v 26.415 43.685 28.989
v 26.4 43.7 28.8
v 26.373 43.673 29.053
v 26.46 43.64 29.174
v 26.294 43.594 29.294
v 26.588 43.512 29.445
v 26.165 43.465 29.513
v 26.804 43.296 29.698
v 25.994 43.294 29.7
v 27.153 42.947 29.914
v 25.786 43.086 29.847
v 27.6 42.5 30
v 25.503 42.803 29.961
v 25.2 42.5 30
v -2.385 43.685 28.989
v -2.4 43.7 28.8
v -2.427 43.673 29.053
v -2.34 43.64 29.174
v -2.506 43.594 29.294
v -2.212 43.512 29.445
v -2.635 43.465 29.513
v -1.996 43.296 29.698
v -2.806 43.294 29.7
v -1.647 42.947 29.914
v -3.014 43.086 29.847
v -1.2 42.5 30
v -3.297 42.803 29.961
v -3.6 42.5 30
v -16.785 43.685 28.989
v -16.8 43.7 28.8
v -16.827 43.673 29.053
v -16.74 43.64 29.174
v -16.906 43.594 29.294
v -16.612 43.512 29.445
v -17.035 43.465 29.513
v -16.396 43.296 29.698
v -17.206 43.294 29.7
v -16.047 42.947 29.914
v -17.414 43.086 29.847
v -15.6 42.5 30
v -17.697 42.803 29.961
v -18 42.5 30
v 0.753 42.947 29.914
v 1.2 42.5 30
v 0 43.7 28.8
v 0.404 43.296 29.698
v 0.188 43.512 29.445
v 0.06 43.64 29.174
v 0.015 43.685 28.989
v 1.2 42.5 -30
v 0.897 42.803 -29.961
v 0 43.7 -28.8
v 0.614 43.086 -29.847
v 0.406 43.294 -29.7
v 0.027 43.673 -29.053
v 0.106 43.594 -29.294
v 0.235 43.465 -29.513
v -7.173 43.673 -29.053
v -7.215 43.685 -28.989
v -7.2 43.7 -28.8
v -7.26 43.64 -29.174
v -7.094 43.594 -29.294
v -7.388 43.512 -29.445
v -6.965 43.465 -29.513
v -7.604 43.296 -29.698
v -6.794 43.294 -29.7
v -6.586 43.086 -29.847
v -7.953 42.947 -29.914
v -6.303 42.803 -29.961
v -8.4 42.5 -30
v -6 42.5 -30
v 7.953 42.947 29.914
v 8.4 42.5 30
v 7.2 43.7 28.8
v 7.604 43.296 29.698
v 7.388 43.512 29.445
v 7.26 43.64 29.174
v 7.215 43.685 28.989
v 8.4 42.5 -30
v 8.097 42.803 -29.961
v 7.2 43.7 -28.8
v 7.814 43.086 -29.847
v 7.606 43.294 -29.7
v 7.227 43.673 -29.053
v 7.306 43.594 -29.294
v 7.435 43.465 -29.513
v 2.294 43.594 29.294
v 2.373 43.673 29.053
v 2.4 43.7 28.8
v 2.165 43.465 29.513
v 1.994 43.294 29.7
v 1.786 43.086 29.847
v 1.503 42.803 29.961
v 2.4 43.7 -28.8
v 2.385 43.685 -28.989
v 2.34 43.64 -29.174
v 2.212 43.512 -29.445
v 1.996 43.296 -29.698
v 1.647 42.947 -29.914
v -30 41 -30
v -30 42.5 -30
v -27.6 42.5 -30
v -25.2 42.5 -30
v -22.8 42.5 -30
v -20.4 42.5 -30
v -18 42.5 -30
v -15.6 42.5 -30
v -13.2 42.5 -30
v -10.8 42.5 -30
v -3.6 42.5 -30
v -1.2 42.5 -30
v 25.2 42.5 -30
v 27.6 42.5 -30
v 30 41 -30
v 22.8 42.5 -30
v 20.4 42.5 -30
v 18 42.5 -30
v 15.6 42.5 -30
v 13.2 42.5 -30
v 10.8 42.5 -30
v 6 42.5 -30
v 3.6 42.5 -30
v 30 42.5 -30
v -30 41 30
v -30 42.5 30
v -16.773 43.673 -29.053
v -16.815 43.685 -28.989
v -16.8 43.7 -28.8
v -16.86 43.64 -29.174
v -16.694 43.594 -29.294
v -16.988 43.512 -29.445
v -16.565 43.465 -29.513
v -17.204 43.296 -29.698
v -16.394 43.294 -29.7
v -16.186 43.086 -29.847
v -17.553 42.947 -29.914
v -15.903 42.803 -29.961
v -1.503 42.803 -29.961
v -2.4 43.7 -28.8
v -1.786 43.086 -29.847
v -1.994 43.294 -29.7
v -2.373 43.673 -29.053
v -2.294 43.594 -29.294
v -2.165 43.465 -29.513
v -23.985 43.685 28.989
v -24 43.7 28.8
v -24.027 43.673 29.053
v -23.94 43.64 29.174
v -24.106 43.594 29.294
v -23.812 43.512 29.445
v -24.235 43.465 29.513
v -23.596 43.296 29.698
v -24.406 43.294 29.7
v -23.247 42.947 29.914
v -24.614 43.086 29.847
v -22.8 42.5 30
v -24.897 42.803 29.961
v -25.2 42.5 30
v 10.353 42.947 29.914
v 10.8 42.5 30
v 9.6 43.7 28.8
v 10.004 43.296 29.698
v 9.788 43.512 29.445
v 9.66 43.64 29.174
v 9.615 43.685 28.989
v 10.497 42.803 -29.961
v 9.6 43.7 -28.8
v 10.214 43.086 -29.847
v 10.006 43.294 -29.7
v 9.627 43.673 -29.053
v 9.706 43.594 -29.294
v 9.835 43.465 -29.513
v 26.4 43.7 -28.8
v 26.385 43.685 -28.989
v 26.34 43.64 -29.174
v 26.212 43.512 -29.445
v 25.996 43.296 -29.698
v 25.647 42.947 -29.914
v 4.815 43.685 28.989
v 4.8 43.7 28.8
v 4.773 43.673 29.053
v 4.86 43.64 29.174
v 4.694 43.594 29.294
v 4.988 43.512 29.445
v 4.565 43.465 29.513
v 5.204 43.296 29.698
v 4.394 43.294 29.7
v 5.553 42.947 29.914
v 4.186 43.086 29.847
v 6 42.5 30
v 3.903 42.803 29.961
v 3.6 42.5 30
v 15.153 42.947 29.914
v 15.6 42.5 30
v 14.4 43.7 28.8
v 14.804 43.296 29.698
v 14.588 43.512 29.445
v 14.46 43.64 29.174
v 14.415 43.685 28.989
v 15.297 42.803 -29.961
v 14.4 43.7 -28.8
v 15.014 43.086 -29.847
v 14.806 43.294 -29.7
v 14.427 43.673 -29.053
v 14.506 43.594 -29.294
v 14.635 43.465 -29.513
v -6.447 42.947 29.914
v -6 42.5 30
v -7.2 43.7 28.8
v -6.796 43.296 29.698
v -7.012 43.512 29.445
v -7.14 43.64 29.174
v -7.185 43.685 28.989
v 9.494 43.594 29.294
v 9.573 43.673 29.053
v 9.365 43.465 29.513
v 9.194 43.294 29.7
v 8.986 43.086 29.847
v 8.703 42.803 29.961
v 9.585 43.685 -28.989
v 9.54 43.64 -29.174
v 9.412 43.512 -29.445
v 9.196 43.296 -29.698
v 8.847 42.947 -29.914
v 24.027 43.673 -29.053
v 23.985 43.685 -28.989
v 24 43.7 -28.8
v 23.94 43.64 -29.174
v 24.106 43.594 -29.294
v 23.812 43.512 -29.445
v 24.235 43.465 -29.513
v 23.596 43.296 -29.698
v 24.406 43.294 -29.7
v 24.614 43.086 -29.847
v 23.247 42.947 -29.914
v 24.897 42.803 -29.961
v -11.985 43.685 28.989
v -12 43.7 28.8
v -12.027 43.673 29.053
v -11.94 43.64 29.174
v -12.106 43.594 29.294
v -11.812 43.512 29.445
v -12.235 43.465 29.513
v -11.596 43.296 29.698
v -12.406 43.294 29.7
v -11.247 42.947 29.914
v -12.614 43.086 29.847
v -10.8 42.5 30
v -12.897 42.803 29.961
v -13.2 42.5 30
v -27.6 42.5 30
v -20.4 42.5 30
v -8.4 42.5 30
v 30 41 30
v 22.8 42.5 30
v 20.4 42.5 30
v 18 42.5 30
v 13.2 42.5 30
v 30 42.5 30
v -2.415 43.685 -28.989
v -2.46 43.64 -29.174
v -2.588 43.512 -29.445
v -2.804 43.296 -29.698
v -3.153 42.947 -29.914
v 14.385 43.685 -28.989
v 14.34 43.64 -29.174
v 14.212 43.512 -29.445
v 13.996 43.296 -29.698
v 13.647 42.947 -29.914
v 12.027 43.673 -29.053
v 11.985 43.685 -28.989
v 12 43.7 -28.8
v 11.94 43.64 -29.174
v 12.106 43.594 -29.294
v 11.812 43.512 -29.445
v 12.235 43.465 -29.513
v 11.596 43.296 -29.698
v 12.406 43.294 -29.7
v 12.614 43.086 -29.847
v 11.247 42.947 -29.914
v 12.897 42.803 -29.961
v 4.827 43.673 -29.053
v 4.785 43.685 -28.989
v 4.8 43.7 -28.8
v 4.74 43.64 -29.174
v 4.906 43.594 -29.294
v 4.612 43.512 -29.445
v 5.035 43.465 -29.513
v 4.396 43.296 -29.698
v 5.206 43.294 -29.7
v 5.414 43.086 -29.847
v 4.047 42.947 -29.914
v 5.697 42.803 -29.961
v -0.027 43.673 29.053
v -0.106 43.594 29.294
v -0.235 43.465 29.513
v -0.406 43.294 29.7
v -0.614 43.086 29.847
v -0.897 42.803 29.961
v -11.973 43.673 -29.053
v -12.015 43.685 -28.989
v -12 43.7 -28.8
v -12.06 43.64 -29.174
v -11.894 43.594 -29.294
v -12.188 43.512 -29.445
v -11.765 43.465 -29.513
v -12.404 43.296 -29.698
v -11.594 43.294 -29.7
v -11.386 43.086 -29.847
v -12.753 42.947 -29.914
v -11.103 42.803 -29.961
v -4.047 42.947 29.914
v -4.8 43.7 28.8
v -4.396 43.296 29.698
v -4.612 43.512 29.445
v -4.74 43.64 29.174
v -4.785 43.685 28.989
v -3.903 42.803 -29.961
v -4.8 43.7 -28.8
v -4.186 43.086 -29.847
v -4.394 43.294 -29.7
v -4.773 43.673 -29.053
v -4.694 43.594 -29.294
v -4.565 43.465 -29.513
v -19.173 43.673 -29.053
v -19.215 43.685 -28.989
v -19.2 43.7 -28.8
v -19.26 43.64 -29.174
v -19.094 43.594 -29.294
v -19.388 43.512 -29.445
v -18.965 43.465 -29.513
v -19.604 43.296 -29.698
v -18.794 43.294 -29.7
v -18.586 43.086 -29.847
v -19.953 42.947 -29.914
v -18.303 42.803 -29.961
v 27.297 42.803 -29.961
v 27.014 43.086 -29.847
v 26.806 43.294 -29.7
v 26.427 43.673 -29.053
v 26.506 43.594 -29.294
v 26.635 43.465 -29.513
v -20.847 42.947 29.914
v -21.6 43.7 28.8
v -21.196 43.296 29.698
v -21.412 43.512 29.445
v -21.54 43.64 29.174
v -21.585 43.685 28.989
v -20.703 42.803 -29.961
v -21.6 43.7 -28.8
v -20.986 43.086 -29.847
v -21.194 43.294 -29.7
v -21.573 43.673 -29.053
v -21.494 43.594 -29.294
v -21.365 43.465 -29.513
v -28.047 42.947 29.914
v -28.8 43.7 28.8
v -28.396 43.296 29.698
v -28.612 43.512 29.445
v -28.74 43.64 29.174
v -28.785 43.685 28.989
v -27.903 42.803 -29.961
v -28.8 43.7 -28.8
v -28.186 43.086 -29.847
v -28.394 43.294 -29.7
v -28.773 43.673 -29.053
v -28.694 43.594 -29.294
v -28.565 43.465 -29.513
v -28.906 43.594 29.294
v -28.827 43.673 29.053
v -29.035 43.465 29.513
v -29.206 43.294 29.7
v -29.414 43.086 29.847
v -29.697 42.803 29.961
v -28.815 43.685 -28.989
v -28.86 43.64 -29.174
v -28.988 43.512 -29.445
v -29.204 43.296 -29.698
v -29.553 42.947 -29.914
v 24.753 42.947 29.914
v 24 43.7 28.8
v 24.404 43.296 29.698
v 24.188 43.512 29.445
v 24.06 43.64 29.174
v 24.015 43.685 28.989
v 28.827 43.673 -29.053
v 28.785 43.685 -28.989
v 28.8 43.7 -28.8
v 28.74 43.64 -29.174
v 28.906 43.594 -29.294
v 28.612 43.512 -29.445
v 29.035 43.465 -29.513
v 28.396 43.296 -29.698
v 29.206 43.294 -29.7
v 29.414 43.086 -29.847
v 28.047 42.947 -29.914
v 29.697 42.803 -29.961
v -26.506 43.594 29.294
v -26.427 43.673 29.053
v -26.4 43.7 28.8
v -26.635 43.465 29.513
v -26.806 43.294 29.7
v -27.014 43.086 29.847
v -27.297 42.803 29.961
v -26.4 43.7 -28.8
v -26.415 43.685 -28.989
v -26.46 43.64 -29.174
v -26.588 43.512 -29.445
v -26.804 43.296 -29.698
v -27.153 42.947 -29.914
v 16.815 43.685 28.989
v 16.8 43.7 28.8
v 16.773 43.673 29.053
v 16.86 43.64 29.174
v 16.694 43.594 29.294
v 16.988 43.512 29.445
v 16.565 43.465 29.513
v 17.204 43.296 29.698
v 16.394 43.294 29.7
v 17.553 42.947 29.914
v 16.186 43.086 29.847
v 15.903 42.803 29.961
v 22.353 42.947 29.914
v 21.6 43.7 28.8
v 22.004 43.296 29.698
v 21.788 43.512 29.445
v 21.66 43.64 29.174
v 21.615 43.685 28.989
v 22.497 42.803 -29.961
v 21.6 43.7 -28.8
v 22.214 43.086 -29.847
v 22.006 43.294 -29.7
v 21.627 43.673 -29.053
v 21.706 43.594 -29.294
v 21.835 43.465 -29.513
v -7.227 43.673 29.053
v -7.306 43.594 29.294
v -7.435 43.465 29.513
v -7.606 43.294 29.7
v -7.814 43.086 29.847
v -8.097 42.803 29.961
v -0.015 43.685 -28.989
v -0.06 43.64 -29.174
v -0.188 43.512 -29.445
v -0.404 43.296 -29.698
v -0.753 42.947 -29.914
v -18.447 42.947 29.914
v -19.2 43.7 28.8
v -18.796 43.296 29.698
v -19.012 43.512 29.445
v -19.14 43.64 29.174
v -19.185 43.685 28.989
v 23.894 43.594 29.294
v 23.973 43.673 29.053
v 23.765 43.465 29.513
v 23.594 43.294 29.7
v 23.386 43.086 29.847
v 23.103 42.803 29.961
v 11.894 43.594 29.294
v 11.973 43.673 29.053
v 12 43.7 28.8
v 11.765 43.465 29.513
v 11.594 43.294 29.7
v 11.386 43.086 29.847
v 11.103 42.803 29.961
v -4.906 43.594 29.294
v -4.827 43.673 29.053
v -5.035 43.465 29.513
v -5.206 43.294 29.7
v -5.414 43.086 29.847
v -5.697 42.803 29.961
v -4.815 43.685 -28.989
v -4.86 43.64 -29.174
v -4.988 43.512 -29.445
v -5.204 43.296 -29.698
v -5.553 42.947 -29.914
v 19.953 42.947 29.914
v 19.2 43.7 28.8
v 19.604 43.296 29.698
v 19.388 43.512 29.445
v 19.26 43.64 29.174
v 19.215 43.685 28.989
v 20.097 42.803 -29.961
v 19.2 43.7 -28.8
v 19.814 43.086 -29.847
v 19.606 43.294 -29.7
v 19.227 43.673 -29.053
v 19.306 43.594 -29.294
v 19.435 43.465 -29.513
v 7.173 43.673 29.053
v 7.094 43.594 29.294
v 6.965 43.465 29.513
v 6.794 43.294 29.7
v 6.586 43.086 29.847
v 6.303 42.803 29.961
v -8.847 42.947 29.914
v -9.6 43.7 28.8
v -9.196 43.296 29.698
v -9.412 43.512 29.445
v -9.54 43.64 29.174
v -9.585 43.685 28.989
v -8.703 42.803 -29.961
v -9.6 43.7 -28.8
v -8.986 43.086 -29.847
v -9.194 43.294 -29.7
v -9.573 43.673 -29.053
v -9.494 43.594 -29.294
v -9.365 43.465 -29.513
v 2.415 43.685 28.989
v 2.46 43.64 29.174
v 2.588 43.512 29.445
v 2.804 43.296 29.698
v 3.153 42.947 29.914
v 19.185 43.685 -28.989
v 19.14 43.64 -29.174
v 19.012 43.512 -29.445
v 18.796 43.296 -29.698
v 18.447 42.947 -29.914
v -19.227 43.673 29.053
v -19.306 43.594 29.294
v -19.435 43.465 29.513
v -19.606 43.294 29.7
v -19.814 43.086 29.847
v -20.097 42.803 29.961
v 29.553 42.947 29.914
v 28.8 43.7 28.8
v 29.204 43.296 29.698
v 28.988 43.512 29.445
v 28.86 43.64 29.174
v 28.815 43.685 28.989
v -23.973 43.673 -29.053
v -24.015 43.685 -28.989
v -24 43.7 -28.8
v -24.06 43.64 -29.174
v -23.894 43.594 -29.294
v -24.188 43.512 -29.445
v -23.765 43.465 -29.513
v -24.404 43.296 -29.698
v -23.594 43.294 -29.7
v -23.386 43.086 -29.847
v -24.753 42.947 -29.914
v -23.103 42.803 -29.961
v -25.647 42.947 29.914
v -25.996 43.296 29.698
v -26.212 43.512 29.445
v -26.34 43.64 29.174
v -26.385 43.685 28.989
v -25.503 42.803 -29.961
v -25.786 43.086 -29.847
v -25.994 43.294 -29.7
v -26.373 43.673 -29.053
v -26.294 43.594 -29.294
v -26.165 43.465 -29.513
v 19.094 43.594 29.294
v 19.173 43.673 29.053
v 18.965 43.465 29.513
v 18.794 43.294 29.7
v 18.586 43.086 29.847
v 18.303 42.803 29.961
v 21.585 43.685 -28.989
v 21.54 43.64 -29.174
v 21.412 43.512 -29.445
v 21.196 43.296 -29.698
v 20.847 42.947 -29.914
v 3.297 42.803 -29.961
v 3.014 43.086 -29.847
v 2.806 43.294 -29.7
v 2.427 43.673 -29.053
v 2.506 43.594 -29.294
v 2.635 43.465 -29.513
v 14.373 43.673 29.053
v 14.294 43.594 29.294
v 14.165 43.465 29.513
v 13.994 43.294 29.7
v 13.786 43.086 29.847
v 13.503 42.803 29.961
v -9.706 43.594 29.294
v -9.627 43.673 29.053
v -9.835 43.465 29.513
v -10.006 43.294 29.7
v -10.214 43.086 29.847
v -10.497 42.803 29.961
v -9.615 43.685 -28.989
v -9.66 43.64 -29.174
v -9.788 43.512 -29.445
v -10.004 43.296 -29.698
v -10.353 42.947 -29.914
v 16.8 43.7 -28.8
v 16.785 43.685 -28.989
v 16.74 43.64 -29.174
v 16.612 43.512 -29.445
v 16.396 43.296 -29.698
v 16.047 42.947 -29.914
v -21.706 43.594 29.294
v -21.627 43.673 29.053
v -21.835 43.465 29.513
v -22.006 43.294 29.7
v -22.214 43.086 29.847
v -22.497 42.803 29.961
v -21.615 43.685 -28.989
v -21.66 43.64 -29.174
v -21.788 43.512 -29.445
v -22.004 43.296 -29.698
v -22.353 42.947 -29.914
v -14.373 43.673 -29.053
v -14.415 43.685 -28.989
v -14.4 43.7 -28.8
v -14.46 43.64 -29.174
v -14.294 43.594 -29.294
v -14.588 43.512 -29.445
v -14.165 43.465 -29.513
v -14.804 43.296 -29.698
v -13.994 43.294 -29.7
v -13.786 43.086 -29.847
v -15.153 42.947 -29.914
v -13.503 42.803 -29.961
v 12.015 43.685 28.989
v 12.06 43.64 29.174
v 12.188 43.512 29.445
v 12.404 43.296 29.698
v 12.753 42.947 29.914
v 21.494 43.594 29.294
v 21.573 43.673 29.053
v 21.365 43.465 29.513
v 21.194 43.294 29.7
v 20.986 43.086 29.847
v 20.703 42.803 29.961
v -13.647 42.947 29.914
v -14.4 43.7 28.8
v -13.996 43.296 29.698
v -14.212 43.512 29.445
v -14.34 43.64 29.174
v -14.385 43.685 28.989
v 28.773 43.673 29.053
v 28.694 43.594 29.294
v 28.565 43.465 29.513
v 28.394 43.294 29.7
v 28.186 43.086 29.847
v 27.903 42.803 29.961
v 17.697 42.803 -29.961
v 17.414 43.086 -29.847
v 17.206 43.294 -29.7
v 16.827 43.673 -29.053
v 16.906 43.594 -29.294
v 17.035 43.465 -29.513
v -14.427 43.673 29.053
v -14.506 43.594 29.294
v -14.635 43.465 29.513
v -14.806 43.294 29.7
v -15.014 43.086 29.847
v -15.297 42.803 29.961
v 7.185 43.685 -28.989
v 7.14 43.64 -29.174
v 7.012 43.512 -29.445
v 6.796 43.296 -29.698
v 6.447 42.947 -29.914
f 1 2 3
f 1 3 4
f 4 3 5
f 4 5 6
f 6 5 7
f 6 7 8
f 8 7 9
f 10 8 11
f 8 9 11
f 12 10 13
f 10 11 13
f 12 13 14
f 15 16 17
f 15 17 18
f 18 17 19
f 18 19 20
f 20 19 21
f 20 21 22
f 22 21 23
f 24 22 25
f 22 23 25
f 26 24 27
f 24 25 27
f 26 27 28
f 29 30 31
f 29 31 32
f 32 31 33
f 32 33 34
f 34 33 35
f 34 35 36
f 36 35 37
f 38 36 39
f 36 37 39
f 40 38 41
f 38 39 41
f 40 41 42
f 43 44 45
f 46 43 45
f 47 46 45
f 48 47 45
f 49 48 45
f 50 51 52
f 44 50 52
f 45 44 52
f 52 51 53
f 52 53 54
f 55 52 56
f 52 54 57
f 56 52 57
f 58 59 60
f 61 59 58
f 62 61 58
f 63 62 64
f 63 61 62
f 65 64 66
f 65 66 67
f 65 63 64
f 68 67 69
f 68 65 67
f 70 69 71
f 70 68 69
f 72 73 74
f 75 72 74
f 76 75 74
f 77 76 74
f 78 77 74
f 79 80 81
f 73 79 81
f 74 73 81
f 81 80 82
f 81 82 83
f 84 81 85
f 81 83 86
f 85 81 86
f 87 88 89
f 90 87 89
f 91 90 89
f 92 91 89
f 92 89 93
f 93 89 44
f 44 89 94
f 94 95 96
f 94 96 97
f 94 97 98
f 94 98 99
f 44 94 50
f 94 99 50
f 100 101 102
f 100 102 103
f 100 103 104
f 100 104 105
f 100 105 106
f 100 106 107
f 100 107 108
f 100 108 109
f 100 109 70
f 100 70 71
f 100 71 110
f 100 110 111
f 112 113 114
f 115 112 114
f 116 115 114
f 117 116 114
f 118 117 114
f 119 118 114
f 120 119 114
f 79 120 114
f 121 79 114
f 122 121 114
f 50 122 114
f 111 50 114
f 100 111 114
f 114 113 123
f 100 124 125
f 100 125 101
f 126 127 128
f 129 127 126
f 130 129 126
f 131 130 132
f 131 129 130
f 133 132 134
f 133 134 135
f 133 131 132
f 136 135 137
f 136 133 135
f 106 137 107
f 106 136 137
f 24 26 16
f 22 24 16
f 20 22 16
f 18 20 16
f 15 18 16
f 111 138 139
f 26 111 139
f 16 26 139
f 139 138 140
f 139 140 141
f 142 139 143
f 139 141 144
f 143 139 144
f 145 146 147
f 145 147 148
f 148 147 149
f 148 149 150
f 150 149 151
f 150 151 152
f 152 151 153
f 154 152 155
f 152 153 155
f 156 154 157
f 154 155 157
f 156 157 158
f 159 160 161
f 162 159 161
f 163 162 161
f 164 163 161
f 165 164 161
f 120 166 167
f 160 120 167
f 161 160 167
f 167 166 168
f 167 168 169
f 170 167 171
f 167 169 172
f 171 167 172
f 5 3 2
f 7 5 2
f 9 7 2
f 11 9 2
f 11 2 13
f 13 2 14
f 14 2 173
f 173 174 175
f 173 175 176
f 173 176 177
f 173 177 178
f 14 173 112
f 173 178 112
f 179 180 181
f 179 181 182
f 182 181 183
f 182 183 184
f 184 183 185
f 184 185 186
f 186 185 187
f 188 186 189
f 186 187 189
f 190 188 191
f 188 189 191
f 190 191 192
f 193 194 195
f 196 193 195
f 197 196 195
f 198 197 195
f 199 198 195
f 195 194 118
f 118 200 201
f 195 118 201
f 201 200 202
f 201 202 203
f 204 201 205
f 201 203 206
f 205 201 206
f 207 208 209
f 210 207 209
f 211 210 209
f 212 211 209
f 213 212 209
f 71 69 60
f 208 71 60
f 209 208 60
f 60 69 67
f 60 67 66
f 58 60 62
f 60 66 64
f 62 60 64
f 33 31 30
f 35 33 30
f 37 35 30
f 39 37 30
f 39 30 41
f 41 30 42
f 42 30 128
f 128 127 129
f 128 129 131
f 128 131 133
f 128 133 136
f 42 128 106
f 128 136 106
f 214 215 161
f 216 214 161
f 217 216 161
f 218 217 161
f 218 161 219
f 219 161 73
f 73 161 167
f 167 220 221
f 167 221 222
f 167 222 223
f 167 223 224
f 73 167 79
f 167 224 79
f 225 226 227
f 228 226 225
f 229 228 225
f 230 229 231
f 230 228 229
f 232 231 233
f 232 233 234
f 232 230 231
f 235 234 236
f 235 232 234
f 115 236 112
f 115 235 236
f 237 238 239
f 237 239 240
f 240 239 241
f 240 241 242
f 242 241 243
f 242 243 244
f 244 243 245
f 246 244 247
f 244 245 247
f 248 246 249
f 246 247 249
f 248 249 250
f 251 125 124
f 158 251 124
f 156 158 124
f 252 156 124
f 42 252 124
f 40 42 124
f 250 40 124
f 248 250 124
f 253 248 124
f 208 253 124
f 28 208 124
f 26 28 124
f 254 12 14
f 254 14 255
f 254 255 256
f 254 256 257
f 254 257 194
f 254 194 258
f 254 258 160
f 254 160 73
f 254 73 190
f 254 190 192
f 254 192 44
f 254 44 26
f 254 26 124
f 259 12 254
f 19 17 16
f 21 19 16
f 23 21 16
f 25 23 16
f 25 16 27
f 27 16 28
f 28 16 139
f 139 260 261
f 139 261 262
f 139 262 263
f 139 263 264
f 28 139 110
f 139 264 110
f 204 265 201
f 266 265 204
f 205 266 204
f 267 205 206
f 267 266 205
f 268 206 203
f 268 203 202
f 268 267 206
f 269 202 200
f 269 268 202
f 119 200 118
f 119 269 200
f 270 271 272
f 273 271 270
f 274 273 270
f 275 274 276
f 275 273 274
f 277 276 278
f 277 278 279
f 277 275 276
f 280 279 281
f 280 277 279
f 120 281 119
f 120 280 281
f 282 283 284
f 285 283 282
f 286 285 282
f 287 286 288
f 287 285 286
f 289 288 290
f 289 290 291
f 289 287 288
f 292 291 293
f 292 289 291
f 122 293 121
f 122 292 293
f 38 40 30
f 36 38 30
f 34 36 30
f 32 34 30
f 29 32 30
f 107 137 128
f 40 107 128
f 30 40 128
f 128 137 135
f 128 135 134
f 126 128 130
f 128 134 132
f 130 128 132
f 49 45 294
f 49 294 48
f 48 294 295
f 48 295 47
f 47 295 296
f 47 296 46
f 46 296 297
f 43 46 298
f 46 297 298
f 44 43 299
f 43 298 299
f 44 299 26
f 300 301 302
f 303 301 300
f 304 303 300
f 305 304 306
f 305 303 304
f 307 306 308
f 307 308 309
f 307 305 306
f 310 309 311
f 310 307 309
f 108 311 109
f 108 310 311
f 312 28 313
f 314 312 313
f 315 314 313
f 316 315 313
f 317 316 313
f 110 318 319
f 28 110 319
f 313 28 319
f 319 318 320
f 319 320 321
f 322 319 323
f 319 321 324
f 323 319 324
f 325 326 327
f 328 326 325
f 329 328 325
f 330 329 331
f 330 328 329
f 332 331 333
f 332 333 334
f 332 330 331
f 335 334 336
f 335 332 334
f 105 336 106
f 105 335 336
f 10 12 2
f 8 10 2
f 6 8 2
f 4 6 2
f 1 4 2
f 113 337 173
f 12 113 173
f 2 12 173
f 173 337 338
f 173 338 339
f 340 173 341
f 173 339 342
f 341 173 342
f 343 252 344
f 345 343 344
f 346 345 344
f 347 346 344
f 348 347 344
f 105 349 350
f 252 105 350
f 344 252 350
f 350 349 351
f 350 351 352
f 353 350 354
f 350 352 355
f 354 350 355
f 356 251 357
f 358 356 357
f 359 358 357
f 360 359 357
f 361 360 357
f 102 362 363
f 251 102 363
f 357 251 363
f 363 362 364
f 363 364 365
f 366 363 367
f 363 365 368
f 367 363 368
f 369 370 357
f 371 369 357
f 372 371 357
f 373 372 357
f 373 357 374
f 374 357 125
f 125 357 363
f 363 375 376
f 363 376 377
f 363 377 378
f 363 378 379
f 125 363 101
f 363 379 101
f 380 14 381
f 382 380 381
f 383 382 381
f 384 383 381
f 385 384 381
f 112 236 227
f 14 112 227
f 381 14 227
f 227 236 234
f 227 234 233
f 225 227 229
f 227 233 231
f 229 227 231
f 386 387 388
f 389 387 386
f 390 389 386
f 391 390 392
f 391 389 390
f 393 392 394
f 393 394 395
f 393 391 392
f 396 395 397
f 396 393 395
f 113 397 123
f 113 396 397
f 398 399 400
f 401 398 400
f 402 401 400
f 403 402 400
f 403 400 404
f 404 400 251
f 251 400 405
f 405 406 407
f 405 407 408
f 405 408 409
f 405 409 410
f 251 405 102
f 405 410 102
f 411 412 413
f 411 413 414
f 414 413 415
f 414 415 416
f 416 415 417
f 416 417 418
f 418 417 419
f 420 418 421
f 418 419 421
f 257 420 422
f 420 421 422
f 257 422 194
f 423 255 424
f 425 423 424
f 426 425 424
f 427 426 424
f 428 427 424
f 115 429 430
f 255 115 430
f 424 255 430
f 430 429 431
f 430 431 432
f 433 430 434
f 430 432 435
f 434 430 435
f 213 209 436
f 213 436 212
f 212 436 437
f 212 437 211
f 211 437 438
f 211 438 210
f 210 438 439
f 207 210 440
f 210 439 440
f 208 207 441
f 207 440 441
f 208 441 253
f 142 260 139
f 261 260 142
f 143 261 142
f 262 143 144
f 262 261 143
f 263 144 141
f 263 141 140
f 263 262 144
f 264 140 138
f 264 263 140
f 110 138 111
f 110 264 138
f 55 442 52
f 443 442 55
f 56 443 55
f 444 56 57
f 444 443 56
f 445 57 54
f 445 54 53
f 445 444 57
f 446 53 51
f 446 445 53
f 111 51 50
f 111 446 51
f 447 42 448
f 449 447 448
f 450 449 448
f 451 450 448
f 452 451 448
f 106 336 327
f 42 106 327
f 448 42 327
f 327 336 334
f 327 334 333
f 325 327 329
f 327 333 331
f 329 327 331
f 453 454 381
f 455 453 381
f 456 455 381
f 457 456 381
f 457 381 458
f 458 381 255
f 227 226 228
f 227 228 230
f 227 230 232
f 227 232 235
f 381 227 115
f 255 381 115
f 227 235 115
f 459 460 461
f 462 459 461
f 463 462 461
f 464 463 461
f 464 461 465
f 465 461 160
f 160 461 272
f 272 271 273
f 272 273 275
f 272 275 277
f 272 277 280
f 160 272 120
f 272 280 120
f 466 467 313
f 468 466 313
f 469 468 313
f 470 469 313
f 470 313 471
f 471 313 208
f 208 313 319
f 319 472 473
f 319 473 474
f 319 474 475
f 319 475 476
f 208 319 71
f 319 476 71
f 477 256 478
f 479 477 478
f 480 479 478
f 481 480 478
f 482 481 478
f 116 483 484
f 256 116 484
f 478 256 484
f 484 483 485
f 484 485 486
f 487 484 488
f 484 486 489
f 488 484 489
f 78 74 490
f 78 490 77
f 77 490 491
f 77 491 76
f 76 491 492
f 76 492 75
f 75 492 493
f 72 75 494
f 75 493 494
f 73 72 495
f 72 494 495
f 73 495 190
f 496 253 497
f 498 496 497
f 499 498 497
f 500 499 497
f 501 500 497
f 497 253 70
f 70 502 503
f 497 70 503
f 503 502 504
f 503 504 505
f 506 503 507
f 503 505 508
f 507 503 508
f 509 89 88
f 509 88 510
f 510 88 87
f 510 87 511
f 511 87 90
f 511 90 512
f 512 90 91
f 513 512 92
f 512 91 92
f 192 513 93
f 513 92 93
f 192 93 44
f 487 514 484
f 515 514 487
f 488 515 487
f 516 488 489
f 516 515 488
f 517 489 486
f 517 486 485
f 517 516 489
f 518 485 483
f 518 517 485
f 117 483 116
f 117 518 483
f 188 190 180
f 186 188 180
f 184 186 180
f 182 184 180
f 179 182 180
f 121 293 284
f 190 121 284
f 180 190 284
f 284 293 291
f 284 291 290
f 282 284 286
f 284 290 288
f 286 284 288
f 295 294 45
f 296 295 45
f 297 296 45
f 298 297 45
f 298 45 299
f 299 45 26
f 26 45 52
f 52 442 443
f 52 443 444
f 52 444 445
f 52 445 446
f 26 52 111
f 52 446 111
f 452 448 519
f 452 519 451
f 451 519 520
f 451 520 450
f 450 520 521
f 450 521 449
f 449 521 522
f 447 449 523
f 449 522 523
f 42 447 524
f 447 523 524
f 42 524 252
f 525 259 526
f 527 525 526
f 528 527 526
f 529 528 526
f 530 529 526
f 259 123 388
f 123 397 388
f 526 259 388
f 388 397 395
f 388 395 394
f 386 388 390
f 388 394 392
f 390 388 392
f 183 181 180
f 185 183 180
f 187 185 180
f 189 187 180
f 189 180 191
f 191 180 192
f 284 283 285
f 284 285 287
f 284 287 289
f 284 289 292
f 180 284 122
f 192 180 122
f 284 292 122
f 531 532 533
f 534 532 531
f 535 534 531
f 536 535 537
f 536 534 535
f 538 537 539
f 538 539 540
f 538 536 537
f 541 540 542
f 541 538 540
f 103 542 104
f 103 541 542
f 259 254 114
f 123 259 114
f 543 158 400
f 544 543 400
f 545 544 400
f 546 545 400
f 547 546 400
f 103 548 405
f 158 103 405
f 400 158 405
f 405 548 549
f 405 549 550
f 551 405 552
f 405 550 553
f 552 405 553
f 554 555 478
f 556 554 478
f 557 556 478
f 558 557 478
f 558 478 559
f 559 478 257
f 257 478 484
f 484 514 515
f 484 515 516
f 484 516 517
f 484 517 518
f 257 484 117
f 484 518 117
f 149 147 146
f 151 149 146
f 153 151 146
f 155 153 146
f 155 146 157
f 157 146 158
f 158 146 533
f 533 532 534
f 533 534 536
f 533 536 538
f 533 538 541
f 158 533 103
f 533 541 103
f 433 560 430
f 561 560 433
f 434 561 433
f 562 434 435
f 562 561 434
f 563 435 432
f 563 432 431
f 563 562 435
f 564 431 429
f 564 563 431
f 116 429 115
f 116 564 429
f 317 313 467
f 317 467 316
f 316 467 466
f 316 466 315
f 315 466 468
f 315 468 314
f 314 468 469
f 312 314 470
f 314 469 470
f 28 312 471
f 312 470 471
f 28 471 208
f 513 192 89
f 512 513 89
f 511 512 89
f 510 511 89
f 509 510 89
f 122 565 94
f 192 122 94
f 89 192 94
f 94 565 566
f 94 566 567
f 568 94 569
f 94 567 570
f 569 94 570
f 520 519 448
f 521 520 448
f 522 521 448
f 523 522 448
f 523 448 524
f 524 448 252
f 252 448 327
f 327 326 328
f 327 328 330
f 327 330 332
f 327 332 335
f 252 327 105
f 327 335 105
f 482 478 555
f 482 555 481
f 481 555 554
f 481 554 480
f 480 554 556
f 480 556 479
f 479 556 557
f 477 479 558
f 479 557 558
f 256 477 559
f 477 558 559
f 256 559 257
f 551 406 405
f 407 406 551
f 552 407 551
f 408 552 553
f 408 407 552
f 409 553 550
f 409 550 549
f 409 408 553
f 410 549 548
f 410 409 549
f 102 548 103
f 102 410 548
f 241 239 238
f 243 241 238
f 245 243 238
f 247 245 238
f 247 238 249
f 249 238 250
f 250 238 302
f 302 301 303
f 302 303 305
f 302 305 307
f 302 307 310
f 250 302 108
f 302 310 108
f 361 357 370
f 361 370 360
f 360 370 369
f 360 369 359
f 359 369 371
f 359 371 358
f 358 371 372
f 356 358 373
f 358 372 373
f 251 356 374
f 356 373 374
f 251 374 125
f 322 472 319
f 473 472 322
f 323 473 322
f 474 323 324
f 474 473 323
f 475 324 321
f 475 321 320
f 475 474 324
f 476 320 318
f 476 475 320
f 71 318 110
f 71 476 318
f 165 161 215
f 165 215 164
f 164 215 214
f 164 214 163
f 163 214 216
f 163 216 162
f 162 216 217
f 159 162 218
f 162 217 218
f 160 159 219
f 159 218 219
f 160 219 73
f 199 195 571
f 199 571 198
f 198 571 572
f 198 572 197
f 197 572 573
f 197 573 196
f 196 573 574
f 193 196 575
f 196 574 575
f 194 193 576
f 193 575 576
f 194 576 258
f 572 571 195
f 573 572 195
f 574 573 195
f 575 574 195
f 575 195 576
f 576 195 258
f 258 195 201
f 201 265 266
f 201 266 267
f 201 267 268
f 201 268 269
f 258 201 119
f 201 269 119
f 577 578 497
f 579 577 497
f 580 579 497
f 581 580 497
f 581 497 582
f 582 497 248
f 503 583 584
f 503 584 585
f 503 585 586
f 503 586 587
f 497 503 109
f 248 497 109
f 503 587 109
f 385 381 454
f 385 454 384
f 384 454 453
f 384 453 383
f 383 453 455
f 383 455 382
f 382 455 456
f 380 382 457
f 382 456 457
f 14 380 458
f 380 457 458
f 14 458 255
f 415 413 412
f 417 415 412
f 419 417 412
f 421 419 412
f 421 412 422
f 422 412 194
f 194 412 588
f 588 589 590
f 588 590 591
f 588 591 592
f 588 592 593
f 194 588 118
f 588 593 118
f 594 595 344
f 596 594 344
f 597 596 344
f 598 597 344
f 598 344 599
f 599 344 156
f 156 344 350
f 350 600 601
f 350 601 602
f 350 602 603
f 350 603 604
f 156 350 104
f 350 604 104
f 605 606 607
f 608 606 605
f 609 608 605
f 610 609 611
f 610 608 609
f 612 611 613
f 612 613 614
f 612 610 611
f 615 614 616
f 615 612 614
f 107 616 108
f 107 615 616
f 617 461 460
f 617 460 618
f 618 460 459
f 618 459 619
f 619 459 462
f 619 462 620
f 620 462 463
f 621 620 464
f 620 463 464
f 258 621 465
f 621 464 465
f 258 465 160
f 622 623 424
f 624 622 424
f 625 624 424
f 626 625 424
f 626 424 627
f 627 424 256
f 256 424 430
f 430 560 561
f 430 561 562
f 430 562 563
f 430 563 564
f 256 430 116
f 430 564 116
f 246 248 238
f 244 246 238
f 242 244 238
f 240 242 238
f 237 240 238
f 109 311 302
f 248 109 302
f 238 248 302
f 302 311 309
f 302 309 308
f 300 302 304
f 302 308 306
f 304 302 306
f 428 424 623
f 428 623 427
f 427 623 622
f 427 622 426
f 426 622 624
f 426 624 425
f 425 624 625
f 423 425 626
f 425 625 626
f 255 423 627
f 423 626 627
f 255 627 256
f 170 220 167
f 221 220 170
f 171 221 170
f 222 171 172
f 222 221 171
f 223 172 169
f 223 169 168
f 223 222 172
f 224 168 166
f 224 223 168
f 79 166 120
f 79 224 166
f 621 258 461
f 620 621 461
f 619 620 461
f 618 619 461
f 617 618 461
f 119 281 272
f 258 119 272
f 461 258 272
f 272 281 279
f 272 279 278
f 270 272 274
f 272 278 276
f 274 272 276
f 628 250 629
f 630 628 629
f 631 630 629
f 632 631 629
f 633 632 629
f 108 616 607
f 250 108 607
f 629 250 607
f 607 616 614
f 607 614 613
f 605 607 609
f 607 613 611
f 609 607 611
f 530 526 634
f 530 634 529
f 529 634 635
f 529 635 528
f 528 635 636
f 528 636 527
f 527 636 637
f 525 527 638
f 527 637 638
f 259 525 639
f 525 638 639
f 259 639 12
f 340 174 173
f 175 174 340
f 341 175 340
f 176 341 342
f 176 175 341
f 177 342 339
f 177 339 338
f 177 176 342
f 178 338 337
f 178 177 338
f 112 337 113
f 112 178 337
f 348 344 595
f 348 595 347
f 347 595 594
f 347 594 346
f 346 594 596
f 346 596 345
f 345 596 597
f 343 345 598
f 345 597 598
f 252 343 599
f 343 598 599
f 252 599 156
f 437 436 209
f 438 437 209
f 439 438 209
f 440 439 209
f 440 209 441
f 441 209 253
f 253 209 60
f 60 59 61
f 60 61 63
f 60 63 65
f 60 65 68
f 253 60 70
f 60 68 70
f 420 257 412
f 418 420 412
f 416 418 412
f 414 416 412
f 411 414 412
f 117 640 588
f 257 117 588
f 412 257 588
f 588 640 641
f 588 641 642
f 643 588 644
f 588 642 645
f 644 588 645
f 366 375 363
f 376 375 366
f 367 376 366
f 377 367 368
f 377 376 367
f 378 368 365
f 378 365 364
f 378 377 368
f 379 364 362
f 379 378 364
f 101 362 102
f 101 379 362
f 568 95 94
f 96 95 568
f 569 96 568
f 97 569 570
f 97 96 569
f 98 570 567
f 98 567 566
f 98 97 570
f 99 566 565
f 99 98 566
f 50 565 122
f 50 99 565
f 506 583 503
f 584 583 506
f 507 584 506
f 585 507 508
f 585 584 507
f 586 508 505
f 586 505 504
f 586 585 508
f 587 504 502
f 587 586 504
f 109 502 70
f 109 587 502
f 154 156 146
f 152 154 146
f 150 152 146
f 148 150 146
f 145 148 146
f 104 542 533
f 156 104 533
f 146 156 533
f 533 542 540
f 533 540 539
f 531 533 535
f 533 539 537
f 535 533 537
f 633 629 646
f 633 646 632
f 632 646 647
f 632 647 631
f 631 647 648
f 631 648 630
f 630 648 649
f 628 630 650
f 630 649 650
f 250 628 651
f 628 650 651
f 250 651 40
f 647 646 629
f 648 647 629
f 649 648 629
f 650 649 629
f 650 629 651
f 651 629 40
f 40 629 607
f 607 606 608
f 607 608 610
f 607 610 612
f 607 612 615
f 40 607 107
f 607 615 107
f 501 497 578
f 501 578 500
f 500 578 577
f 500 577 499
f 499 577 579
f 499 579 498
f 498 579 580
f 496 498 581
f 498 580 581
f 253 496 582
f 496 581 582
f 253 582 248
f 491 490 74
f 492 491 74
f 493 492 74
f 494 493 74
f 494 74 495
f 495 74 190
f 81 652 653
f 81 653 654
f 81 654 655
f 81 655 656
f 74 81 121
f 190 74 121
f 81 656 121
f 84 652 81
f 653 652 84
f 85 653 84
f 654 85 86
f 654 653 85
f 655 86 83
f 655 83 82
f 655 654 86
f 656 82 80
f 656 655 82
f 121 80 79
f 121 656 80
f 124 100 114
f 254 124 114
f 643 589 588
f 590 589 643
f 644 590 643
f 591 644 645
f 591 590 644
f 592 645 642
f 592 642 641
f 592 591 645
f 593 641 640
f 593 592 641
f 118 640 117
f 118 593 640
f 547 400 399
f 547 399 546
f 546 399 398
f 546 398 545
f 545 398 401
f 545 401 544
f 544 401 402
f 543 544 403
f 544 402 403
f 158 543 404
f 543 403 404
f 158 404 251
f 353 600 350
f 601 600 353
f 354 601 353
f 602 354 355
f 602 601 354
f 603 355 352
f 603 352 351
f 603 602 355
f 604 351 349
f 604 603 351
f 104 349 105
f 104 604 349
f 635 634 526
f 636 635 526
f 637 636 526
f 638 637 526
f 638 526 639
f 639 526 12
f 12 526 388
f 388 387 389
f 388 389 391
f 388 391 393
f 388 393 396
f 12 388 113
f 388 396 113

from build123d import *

# Parameters (mm, degrees)
SKETCH1_W               = 60
SKETCH1_H               = 60
SKETCH1_W_2             = 55
SKETCH1_H_2             = 55
BOSS_EXTRUDE1_DEPTH     = 40
SKETCH2_W               = 60
SKETCH2_H               = 60
BOSS_EXTRUDE2_DEPTH     = 2.5
BOSS_EXTRUDE3_DEPTH     = 60
CUT_EXTRUDE1_REACH      = 82.061
CUT_EXTRUDE2_DEPTH      = 81.060539593
CUT_EXTRUDE2_DEPTH_BACK = 81.060539593
SKETCH5_W               = 60
SKETCH5_H               = 41


with BuildPart() as part:
    # Sketch1 → Boss-Extrude1 (new body)
    with BuildSketch(Plane(origin=(0, 0, 0), x_dir=(1, 0, 0), z_dir=(0, 1, 0))):
        Rectangle(SKETCH1_W, SKETCH1_H)
        Rectangle(SKETCH1_W_2, SKETCH1_H_2, mode=Mode.SUBTRACT)
    extrude(amount=BOSS_EXTRUDE1_DEPTH)

    # Sketch2 → Boss-Extrude2 (add)
    with BuildSketch(Plane(origin=(0, 40, 0), x_dir=(1, 0, 0), z_dir=(0, 1, 0))):
        Rectangle(SKETCH2_W, SKETCH2_H)
    extrude(amount=BOSS_EXTRUDE2_DEPTH)

    # Sketch3 → Boss-Extrude3 (add)
    with BuildSketch(Plane(origin=(0, 0, -30), x_dir=(-1, 0, 0), z_dir=(0, 0, -1))):
        Polygon((-30, 42.5), (-28.8, 43.7), (-27.6, 42.5), (-26.4, 43.7), (-25.2, 42.5), (-24, 43.7), (-22.8, 42.5), (-21.6, 43.7), (-20.4, 42.5), (-19.2, 43.7), (-18, 42.5), (-16.8, 43.7), (-15.6, 42.5), (-14.4, 43.7), (-13.2, 42.5), (-12, 43.7), (-10.8, 42.5), (-9.6, 43.7), (-8.4, 42.5), (-7.2, 43.7), (-6, 42.5), (-4.8, 43.7), (-3.6, 42.5), (-2.4, 43.7), (-1.2, 42.5), (0, 43.7), (1.2, 42.5), (2.4, 43.7), (3.6, 42.5), (4.8, 43.7), (6, 42.5), (7.2, 43.7), (8.4, 42.5), (9.6, 43.7), (10.8, 42.5), (12, 43.7), (13.2, 42.5), (14.4, 43.7), (15.6, 42.5), (16.8, 43.7), (18, 42.5), (19.2, 43.7), (20.4, 42.5), (21.6, 43.7), (22.8, 42.5), (24, 43.7), (25.2, 42.5), (26.4, 43.7), (27.6, 42.5), (28.8, 43.7), (30, 42.5), (30, 42.170064374), (-30, 42.170064374), align=None)
    extrude(amount=-BOSS_EXTRUDE3_DEPTH)

    # Cut-Extrude1: up to this face of the body (flat: up to its plane)
    cut_extrude1_end = Plane(part.part.faces().sort_by_distance((30, 21.25, 0))[0])
    # Sketch4 → Cut-Extrude1 (cut, up to the picked face)
    with BuildSketch(Plane.ZY.offset(30), mode=Mode.PRIVATE) as cut_extrude1_sk1:
        with BuildLine():
            Line((-30, 42.5), (-30, 43.7))
            Line((-30, 43.7), (-28.8, 43.7))
            ThreePointArc((-28.8, 43.7), (-29.648528137, 43.348528137), (-30, 42.5))
        make_face()
    cut_extrude1_tool1 = split(extrude(cut_extrude1_sk1.sketch, amount=-CUT_EXTRUDE1_REACH, mode=Mode.PRIVATE), bisect_by=cut_extrude1_end, keep=Keep.BOTH, mode=Mode.PRIVATE)
    cut_extrude1 = cut_extrude1_tool1.solids().sort_by(Axis((-30, 43.431958, -29.731958), (1, 0, 0)))[0]
    add(cut_extrude1, mode=Mode.SUBTRACT)

    # Mirror1: Cut-Extrude1 across plane
    add(cut_extrude1.mirror(Plane.XY), mode=Mode.SUBTRACT)

    # Sketch5 → Cut-Extrude2 (cut, two sides: drawn at the far end of the back side and taken through both)
    with BuildSketch(Plane.XY.offset(30).offset(-CUT_EXTRUDE2_DEPTH_BACK)):
        with Locations((0, 20.5)):
            Rectangle(SKETCH5_W, SKETCH5_H)
    extrude(amount=CUT_EXTRUDE2_DEPTH + CUT_EXTRUDE2_DEPTH_BACK, mode=Mode.SUBTRACT)


solid = part.part
